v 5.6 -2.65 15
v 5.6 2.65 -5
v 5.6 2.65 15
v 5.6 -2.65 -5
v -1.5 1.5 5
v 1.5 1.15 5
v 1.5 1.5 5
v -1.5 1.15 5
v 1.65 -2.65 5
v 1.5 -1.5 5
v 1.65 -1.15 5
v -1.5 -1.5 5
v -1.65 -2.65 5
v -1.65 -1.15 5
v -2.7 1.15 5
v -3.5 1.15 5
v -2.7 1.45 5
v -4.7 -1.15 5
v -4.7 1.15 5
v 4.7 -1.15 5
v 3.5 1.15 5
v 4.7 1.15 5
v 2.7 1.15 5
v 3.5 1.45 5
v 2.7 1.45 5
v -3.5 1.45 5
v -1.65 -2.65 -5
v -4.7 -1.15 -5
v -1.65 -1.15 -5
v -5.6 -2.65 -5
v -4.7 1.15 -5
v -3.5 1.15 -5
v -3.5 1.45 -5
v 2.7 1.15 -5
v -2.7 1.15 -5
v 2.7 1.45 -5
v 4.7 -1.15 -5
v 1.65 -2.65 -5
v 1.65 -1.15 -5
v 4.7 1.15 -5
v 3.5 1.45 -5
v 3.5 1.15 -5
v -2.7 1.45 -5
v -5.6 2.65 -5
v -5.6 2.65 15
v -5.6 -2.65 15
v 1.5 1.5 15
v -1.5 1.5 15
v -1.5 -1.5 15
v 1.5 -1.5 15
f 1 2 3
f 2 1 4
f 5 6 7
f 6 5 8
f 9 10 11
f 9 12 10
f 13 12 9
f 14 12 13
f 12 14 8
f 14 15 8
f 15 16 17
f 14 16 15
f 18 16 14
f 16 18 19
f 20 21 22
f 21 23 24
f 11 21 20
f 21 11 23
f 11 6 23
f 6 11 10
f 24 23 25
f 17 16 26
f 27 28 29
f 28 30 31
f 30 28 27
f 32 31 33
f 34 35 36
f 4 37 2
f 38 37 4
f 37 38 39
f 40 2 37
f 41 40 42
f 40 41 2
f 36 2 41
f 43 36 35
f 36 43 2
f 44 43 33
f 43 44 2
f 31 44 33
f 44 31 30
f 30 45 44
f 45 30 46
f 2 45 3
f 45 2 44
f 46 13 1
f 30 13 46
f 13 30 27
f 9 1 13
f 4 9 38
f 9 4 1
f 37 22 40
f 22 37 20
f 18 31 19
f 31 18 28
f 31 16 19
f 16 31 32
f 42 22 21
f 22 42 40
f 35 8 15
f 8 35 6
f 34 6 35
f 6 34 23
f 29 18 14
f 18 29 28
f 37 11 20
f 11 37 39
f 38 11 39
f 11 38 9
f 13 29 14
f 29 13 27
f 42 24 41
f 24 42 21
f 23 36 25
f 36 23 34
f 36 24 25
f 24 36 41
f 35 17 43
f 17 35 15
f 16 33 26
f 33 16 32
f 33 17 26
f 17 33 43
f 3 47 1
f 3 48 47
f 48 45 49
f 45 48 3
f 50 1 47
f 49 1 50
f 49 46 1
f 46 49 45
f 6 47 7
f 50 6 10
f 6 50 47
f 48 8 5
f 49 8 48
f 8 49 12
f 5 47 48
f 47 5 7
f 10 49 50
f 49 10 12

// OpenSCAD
difference(){
    cube([11.2,5.3,10], true);
    cube([9.4,2.3,10], true);
    translate([0,-1.9,0]) cube([3.3,2,10], true);
    #translate([3.1,1.3,0]) cube([0.8,0.3,10], true);
    translate([-3.1,1.3,0]) cube([0.8,0.3,10], true);
}
 translate([0,0,10]) difference(){
    cube([11.2,5.3,10], true);
    cube([3,3,10], true);
}
